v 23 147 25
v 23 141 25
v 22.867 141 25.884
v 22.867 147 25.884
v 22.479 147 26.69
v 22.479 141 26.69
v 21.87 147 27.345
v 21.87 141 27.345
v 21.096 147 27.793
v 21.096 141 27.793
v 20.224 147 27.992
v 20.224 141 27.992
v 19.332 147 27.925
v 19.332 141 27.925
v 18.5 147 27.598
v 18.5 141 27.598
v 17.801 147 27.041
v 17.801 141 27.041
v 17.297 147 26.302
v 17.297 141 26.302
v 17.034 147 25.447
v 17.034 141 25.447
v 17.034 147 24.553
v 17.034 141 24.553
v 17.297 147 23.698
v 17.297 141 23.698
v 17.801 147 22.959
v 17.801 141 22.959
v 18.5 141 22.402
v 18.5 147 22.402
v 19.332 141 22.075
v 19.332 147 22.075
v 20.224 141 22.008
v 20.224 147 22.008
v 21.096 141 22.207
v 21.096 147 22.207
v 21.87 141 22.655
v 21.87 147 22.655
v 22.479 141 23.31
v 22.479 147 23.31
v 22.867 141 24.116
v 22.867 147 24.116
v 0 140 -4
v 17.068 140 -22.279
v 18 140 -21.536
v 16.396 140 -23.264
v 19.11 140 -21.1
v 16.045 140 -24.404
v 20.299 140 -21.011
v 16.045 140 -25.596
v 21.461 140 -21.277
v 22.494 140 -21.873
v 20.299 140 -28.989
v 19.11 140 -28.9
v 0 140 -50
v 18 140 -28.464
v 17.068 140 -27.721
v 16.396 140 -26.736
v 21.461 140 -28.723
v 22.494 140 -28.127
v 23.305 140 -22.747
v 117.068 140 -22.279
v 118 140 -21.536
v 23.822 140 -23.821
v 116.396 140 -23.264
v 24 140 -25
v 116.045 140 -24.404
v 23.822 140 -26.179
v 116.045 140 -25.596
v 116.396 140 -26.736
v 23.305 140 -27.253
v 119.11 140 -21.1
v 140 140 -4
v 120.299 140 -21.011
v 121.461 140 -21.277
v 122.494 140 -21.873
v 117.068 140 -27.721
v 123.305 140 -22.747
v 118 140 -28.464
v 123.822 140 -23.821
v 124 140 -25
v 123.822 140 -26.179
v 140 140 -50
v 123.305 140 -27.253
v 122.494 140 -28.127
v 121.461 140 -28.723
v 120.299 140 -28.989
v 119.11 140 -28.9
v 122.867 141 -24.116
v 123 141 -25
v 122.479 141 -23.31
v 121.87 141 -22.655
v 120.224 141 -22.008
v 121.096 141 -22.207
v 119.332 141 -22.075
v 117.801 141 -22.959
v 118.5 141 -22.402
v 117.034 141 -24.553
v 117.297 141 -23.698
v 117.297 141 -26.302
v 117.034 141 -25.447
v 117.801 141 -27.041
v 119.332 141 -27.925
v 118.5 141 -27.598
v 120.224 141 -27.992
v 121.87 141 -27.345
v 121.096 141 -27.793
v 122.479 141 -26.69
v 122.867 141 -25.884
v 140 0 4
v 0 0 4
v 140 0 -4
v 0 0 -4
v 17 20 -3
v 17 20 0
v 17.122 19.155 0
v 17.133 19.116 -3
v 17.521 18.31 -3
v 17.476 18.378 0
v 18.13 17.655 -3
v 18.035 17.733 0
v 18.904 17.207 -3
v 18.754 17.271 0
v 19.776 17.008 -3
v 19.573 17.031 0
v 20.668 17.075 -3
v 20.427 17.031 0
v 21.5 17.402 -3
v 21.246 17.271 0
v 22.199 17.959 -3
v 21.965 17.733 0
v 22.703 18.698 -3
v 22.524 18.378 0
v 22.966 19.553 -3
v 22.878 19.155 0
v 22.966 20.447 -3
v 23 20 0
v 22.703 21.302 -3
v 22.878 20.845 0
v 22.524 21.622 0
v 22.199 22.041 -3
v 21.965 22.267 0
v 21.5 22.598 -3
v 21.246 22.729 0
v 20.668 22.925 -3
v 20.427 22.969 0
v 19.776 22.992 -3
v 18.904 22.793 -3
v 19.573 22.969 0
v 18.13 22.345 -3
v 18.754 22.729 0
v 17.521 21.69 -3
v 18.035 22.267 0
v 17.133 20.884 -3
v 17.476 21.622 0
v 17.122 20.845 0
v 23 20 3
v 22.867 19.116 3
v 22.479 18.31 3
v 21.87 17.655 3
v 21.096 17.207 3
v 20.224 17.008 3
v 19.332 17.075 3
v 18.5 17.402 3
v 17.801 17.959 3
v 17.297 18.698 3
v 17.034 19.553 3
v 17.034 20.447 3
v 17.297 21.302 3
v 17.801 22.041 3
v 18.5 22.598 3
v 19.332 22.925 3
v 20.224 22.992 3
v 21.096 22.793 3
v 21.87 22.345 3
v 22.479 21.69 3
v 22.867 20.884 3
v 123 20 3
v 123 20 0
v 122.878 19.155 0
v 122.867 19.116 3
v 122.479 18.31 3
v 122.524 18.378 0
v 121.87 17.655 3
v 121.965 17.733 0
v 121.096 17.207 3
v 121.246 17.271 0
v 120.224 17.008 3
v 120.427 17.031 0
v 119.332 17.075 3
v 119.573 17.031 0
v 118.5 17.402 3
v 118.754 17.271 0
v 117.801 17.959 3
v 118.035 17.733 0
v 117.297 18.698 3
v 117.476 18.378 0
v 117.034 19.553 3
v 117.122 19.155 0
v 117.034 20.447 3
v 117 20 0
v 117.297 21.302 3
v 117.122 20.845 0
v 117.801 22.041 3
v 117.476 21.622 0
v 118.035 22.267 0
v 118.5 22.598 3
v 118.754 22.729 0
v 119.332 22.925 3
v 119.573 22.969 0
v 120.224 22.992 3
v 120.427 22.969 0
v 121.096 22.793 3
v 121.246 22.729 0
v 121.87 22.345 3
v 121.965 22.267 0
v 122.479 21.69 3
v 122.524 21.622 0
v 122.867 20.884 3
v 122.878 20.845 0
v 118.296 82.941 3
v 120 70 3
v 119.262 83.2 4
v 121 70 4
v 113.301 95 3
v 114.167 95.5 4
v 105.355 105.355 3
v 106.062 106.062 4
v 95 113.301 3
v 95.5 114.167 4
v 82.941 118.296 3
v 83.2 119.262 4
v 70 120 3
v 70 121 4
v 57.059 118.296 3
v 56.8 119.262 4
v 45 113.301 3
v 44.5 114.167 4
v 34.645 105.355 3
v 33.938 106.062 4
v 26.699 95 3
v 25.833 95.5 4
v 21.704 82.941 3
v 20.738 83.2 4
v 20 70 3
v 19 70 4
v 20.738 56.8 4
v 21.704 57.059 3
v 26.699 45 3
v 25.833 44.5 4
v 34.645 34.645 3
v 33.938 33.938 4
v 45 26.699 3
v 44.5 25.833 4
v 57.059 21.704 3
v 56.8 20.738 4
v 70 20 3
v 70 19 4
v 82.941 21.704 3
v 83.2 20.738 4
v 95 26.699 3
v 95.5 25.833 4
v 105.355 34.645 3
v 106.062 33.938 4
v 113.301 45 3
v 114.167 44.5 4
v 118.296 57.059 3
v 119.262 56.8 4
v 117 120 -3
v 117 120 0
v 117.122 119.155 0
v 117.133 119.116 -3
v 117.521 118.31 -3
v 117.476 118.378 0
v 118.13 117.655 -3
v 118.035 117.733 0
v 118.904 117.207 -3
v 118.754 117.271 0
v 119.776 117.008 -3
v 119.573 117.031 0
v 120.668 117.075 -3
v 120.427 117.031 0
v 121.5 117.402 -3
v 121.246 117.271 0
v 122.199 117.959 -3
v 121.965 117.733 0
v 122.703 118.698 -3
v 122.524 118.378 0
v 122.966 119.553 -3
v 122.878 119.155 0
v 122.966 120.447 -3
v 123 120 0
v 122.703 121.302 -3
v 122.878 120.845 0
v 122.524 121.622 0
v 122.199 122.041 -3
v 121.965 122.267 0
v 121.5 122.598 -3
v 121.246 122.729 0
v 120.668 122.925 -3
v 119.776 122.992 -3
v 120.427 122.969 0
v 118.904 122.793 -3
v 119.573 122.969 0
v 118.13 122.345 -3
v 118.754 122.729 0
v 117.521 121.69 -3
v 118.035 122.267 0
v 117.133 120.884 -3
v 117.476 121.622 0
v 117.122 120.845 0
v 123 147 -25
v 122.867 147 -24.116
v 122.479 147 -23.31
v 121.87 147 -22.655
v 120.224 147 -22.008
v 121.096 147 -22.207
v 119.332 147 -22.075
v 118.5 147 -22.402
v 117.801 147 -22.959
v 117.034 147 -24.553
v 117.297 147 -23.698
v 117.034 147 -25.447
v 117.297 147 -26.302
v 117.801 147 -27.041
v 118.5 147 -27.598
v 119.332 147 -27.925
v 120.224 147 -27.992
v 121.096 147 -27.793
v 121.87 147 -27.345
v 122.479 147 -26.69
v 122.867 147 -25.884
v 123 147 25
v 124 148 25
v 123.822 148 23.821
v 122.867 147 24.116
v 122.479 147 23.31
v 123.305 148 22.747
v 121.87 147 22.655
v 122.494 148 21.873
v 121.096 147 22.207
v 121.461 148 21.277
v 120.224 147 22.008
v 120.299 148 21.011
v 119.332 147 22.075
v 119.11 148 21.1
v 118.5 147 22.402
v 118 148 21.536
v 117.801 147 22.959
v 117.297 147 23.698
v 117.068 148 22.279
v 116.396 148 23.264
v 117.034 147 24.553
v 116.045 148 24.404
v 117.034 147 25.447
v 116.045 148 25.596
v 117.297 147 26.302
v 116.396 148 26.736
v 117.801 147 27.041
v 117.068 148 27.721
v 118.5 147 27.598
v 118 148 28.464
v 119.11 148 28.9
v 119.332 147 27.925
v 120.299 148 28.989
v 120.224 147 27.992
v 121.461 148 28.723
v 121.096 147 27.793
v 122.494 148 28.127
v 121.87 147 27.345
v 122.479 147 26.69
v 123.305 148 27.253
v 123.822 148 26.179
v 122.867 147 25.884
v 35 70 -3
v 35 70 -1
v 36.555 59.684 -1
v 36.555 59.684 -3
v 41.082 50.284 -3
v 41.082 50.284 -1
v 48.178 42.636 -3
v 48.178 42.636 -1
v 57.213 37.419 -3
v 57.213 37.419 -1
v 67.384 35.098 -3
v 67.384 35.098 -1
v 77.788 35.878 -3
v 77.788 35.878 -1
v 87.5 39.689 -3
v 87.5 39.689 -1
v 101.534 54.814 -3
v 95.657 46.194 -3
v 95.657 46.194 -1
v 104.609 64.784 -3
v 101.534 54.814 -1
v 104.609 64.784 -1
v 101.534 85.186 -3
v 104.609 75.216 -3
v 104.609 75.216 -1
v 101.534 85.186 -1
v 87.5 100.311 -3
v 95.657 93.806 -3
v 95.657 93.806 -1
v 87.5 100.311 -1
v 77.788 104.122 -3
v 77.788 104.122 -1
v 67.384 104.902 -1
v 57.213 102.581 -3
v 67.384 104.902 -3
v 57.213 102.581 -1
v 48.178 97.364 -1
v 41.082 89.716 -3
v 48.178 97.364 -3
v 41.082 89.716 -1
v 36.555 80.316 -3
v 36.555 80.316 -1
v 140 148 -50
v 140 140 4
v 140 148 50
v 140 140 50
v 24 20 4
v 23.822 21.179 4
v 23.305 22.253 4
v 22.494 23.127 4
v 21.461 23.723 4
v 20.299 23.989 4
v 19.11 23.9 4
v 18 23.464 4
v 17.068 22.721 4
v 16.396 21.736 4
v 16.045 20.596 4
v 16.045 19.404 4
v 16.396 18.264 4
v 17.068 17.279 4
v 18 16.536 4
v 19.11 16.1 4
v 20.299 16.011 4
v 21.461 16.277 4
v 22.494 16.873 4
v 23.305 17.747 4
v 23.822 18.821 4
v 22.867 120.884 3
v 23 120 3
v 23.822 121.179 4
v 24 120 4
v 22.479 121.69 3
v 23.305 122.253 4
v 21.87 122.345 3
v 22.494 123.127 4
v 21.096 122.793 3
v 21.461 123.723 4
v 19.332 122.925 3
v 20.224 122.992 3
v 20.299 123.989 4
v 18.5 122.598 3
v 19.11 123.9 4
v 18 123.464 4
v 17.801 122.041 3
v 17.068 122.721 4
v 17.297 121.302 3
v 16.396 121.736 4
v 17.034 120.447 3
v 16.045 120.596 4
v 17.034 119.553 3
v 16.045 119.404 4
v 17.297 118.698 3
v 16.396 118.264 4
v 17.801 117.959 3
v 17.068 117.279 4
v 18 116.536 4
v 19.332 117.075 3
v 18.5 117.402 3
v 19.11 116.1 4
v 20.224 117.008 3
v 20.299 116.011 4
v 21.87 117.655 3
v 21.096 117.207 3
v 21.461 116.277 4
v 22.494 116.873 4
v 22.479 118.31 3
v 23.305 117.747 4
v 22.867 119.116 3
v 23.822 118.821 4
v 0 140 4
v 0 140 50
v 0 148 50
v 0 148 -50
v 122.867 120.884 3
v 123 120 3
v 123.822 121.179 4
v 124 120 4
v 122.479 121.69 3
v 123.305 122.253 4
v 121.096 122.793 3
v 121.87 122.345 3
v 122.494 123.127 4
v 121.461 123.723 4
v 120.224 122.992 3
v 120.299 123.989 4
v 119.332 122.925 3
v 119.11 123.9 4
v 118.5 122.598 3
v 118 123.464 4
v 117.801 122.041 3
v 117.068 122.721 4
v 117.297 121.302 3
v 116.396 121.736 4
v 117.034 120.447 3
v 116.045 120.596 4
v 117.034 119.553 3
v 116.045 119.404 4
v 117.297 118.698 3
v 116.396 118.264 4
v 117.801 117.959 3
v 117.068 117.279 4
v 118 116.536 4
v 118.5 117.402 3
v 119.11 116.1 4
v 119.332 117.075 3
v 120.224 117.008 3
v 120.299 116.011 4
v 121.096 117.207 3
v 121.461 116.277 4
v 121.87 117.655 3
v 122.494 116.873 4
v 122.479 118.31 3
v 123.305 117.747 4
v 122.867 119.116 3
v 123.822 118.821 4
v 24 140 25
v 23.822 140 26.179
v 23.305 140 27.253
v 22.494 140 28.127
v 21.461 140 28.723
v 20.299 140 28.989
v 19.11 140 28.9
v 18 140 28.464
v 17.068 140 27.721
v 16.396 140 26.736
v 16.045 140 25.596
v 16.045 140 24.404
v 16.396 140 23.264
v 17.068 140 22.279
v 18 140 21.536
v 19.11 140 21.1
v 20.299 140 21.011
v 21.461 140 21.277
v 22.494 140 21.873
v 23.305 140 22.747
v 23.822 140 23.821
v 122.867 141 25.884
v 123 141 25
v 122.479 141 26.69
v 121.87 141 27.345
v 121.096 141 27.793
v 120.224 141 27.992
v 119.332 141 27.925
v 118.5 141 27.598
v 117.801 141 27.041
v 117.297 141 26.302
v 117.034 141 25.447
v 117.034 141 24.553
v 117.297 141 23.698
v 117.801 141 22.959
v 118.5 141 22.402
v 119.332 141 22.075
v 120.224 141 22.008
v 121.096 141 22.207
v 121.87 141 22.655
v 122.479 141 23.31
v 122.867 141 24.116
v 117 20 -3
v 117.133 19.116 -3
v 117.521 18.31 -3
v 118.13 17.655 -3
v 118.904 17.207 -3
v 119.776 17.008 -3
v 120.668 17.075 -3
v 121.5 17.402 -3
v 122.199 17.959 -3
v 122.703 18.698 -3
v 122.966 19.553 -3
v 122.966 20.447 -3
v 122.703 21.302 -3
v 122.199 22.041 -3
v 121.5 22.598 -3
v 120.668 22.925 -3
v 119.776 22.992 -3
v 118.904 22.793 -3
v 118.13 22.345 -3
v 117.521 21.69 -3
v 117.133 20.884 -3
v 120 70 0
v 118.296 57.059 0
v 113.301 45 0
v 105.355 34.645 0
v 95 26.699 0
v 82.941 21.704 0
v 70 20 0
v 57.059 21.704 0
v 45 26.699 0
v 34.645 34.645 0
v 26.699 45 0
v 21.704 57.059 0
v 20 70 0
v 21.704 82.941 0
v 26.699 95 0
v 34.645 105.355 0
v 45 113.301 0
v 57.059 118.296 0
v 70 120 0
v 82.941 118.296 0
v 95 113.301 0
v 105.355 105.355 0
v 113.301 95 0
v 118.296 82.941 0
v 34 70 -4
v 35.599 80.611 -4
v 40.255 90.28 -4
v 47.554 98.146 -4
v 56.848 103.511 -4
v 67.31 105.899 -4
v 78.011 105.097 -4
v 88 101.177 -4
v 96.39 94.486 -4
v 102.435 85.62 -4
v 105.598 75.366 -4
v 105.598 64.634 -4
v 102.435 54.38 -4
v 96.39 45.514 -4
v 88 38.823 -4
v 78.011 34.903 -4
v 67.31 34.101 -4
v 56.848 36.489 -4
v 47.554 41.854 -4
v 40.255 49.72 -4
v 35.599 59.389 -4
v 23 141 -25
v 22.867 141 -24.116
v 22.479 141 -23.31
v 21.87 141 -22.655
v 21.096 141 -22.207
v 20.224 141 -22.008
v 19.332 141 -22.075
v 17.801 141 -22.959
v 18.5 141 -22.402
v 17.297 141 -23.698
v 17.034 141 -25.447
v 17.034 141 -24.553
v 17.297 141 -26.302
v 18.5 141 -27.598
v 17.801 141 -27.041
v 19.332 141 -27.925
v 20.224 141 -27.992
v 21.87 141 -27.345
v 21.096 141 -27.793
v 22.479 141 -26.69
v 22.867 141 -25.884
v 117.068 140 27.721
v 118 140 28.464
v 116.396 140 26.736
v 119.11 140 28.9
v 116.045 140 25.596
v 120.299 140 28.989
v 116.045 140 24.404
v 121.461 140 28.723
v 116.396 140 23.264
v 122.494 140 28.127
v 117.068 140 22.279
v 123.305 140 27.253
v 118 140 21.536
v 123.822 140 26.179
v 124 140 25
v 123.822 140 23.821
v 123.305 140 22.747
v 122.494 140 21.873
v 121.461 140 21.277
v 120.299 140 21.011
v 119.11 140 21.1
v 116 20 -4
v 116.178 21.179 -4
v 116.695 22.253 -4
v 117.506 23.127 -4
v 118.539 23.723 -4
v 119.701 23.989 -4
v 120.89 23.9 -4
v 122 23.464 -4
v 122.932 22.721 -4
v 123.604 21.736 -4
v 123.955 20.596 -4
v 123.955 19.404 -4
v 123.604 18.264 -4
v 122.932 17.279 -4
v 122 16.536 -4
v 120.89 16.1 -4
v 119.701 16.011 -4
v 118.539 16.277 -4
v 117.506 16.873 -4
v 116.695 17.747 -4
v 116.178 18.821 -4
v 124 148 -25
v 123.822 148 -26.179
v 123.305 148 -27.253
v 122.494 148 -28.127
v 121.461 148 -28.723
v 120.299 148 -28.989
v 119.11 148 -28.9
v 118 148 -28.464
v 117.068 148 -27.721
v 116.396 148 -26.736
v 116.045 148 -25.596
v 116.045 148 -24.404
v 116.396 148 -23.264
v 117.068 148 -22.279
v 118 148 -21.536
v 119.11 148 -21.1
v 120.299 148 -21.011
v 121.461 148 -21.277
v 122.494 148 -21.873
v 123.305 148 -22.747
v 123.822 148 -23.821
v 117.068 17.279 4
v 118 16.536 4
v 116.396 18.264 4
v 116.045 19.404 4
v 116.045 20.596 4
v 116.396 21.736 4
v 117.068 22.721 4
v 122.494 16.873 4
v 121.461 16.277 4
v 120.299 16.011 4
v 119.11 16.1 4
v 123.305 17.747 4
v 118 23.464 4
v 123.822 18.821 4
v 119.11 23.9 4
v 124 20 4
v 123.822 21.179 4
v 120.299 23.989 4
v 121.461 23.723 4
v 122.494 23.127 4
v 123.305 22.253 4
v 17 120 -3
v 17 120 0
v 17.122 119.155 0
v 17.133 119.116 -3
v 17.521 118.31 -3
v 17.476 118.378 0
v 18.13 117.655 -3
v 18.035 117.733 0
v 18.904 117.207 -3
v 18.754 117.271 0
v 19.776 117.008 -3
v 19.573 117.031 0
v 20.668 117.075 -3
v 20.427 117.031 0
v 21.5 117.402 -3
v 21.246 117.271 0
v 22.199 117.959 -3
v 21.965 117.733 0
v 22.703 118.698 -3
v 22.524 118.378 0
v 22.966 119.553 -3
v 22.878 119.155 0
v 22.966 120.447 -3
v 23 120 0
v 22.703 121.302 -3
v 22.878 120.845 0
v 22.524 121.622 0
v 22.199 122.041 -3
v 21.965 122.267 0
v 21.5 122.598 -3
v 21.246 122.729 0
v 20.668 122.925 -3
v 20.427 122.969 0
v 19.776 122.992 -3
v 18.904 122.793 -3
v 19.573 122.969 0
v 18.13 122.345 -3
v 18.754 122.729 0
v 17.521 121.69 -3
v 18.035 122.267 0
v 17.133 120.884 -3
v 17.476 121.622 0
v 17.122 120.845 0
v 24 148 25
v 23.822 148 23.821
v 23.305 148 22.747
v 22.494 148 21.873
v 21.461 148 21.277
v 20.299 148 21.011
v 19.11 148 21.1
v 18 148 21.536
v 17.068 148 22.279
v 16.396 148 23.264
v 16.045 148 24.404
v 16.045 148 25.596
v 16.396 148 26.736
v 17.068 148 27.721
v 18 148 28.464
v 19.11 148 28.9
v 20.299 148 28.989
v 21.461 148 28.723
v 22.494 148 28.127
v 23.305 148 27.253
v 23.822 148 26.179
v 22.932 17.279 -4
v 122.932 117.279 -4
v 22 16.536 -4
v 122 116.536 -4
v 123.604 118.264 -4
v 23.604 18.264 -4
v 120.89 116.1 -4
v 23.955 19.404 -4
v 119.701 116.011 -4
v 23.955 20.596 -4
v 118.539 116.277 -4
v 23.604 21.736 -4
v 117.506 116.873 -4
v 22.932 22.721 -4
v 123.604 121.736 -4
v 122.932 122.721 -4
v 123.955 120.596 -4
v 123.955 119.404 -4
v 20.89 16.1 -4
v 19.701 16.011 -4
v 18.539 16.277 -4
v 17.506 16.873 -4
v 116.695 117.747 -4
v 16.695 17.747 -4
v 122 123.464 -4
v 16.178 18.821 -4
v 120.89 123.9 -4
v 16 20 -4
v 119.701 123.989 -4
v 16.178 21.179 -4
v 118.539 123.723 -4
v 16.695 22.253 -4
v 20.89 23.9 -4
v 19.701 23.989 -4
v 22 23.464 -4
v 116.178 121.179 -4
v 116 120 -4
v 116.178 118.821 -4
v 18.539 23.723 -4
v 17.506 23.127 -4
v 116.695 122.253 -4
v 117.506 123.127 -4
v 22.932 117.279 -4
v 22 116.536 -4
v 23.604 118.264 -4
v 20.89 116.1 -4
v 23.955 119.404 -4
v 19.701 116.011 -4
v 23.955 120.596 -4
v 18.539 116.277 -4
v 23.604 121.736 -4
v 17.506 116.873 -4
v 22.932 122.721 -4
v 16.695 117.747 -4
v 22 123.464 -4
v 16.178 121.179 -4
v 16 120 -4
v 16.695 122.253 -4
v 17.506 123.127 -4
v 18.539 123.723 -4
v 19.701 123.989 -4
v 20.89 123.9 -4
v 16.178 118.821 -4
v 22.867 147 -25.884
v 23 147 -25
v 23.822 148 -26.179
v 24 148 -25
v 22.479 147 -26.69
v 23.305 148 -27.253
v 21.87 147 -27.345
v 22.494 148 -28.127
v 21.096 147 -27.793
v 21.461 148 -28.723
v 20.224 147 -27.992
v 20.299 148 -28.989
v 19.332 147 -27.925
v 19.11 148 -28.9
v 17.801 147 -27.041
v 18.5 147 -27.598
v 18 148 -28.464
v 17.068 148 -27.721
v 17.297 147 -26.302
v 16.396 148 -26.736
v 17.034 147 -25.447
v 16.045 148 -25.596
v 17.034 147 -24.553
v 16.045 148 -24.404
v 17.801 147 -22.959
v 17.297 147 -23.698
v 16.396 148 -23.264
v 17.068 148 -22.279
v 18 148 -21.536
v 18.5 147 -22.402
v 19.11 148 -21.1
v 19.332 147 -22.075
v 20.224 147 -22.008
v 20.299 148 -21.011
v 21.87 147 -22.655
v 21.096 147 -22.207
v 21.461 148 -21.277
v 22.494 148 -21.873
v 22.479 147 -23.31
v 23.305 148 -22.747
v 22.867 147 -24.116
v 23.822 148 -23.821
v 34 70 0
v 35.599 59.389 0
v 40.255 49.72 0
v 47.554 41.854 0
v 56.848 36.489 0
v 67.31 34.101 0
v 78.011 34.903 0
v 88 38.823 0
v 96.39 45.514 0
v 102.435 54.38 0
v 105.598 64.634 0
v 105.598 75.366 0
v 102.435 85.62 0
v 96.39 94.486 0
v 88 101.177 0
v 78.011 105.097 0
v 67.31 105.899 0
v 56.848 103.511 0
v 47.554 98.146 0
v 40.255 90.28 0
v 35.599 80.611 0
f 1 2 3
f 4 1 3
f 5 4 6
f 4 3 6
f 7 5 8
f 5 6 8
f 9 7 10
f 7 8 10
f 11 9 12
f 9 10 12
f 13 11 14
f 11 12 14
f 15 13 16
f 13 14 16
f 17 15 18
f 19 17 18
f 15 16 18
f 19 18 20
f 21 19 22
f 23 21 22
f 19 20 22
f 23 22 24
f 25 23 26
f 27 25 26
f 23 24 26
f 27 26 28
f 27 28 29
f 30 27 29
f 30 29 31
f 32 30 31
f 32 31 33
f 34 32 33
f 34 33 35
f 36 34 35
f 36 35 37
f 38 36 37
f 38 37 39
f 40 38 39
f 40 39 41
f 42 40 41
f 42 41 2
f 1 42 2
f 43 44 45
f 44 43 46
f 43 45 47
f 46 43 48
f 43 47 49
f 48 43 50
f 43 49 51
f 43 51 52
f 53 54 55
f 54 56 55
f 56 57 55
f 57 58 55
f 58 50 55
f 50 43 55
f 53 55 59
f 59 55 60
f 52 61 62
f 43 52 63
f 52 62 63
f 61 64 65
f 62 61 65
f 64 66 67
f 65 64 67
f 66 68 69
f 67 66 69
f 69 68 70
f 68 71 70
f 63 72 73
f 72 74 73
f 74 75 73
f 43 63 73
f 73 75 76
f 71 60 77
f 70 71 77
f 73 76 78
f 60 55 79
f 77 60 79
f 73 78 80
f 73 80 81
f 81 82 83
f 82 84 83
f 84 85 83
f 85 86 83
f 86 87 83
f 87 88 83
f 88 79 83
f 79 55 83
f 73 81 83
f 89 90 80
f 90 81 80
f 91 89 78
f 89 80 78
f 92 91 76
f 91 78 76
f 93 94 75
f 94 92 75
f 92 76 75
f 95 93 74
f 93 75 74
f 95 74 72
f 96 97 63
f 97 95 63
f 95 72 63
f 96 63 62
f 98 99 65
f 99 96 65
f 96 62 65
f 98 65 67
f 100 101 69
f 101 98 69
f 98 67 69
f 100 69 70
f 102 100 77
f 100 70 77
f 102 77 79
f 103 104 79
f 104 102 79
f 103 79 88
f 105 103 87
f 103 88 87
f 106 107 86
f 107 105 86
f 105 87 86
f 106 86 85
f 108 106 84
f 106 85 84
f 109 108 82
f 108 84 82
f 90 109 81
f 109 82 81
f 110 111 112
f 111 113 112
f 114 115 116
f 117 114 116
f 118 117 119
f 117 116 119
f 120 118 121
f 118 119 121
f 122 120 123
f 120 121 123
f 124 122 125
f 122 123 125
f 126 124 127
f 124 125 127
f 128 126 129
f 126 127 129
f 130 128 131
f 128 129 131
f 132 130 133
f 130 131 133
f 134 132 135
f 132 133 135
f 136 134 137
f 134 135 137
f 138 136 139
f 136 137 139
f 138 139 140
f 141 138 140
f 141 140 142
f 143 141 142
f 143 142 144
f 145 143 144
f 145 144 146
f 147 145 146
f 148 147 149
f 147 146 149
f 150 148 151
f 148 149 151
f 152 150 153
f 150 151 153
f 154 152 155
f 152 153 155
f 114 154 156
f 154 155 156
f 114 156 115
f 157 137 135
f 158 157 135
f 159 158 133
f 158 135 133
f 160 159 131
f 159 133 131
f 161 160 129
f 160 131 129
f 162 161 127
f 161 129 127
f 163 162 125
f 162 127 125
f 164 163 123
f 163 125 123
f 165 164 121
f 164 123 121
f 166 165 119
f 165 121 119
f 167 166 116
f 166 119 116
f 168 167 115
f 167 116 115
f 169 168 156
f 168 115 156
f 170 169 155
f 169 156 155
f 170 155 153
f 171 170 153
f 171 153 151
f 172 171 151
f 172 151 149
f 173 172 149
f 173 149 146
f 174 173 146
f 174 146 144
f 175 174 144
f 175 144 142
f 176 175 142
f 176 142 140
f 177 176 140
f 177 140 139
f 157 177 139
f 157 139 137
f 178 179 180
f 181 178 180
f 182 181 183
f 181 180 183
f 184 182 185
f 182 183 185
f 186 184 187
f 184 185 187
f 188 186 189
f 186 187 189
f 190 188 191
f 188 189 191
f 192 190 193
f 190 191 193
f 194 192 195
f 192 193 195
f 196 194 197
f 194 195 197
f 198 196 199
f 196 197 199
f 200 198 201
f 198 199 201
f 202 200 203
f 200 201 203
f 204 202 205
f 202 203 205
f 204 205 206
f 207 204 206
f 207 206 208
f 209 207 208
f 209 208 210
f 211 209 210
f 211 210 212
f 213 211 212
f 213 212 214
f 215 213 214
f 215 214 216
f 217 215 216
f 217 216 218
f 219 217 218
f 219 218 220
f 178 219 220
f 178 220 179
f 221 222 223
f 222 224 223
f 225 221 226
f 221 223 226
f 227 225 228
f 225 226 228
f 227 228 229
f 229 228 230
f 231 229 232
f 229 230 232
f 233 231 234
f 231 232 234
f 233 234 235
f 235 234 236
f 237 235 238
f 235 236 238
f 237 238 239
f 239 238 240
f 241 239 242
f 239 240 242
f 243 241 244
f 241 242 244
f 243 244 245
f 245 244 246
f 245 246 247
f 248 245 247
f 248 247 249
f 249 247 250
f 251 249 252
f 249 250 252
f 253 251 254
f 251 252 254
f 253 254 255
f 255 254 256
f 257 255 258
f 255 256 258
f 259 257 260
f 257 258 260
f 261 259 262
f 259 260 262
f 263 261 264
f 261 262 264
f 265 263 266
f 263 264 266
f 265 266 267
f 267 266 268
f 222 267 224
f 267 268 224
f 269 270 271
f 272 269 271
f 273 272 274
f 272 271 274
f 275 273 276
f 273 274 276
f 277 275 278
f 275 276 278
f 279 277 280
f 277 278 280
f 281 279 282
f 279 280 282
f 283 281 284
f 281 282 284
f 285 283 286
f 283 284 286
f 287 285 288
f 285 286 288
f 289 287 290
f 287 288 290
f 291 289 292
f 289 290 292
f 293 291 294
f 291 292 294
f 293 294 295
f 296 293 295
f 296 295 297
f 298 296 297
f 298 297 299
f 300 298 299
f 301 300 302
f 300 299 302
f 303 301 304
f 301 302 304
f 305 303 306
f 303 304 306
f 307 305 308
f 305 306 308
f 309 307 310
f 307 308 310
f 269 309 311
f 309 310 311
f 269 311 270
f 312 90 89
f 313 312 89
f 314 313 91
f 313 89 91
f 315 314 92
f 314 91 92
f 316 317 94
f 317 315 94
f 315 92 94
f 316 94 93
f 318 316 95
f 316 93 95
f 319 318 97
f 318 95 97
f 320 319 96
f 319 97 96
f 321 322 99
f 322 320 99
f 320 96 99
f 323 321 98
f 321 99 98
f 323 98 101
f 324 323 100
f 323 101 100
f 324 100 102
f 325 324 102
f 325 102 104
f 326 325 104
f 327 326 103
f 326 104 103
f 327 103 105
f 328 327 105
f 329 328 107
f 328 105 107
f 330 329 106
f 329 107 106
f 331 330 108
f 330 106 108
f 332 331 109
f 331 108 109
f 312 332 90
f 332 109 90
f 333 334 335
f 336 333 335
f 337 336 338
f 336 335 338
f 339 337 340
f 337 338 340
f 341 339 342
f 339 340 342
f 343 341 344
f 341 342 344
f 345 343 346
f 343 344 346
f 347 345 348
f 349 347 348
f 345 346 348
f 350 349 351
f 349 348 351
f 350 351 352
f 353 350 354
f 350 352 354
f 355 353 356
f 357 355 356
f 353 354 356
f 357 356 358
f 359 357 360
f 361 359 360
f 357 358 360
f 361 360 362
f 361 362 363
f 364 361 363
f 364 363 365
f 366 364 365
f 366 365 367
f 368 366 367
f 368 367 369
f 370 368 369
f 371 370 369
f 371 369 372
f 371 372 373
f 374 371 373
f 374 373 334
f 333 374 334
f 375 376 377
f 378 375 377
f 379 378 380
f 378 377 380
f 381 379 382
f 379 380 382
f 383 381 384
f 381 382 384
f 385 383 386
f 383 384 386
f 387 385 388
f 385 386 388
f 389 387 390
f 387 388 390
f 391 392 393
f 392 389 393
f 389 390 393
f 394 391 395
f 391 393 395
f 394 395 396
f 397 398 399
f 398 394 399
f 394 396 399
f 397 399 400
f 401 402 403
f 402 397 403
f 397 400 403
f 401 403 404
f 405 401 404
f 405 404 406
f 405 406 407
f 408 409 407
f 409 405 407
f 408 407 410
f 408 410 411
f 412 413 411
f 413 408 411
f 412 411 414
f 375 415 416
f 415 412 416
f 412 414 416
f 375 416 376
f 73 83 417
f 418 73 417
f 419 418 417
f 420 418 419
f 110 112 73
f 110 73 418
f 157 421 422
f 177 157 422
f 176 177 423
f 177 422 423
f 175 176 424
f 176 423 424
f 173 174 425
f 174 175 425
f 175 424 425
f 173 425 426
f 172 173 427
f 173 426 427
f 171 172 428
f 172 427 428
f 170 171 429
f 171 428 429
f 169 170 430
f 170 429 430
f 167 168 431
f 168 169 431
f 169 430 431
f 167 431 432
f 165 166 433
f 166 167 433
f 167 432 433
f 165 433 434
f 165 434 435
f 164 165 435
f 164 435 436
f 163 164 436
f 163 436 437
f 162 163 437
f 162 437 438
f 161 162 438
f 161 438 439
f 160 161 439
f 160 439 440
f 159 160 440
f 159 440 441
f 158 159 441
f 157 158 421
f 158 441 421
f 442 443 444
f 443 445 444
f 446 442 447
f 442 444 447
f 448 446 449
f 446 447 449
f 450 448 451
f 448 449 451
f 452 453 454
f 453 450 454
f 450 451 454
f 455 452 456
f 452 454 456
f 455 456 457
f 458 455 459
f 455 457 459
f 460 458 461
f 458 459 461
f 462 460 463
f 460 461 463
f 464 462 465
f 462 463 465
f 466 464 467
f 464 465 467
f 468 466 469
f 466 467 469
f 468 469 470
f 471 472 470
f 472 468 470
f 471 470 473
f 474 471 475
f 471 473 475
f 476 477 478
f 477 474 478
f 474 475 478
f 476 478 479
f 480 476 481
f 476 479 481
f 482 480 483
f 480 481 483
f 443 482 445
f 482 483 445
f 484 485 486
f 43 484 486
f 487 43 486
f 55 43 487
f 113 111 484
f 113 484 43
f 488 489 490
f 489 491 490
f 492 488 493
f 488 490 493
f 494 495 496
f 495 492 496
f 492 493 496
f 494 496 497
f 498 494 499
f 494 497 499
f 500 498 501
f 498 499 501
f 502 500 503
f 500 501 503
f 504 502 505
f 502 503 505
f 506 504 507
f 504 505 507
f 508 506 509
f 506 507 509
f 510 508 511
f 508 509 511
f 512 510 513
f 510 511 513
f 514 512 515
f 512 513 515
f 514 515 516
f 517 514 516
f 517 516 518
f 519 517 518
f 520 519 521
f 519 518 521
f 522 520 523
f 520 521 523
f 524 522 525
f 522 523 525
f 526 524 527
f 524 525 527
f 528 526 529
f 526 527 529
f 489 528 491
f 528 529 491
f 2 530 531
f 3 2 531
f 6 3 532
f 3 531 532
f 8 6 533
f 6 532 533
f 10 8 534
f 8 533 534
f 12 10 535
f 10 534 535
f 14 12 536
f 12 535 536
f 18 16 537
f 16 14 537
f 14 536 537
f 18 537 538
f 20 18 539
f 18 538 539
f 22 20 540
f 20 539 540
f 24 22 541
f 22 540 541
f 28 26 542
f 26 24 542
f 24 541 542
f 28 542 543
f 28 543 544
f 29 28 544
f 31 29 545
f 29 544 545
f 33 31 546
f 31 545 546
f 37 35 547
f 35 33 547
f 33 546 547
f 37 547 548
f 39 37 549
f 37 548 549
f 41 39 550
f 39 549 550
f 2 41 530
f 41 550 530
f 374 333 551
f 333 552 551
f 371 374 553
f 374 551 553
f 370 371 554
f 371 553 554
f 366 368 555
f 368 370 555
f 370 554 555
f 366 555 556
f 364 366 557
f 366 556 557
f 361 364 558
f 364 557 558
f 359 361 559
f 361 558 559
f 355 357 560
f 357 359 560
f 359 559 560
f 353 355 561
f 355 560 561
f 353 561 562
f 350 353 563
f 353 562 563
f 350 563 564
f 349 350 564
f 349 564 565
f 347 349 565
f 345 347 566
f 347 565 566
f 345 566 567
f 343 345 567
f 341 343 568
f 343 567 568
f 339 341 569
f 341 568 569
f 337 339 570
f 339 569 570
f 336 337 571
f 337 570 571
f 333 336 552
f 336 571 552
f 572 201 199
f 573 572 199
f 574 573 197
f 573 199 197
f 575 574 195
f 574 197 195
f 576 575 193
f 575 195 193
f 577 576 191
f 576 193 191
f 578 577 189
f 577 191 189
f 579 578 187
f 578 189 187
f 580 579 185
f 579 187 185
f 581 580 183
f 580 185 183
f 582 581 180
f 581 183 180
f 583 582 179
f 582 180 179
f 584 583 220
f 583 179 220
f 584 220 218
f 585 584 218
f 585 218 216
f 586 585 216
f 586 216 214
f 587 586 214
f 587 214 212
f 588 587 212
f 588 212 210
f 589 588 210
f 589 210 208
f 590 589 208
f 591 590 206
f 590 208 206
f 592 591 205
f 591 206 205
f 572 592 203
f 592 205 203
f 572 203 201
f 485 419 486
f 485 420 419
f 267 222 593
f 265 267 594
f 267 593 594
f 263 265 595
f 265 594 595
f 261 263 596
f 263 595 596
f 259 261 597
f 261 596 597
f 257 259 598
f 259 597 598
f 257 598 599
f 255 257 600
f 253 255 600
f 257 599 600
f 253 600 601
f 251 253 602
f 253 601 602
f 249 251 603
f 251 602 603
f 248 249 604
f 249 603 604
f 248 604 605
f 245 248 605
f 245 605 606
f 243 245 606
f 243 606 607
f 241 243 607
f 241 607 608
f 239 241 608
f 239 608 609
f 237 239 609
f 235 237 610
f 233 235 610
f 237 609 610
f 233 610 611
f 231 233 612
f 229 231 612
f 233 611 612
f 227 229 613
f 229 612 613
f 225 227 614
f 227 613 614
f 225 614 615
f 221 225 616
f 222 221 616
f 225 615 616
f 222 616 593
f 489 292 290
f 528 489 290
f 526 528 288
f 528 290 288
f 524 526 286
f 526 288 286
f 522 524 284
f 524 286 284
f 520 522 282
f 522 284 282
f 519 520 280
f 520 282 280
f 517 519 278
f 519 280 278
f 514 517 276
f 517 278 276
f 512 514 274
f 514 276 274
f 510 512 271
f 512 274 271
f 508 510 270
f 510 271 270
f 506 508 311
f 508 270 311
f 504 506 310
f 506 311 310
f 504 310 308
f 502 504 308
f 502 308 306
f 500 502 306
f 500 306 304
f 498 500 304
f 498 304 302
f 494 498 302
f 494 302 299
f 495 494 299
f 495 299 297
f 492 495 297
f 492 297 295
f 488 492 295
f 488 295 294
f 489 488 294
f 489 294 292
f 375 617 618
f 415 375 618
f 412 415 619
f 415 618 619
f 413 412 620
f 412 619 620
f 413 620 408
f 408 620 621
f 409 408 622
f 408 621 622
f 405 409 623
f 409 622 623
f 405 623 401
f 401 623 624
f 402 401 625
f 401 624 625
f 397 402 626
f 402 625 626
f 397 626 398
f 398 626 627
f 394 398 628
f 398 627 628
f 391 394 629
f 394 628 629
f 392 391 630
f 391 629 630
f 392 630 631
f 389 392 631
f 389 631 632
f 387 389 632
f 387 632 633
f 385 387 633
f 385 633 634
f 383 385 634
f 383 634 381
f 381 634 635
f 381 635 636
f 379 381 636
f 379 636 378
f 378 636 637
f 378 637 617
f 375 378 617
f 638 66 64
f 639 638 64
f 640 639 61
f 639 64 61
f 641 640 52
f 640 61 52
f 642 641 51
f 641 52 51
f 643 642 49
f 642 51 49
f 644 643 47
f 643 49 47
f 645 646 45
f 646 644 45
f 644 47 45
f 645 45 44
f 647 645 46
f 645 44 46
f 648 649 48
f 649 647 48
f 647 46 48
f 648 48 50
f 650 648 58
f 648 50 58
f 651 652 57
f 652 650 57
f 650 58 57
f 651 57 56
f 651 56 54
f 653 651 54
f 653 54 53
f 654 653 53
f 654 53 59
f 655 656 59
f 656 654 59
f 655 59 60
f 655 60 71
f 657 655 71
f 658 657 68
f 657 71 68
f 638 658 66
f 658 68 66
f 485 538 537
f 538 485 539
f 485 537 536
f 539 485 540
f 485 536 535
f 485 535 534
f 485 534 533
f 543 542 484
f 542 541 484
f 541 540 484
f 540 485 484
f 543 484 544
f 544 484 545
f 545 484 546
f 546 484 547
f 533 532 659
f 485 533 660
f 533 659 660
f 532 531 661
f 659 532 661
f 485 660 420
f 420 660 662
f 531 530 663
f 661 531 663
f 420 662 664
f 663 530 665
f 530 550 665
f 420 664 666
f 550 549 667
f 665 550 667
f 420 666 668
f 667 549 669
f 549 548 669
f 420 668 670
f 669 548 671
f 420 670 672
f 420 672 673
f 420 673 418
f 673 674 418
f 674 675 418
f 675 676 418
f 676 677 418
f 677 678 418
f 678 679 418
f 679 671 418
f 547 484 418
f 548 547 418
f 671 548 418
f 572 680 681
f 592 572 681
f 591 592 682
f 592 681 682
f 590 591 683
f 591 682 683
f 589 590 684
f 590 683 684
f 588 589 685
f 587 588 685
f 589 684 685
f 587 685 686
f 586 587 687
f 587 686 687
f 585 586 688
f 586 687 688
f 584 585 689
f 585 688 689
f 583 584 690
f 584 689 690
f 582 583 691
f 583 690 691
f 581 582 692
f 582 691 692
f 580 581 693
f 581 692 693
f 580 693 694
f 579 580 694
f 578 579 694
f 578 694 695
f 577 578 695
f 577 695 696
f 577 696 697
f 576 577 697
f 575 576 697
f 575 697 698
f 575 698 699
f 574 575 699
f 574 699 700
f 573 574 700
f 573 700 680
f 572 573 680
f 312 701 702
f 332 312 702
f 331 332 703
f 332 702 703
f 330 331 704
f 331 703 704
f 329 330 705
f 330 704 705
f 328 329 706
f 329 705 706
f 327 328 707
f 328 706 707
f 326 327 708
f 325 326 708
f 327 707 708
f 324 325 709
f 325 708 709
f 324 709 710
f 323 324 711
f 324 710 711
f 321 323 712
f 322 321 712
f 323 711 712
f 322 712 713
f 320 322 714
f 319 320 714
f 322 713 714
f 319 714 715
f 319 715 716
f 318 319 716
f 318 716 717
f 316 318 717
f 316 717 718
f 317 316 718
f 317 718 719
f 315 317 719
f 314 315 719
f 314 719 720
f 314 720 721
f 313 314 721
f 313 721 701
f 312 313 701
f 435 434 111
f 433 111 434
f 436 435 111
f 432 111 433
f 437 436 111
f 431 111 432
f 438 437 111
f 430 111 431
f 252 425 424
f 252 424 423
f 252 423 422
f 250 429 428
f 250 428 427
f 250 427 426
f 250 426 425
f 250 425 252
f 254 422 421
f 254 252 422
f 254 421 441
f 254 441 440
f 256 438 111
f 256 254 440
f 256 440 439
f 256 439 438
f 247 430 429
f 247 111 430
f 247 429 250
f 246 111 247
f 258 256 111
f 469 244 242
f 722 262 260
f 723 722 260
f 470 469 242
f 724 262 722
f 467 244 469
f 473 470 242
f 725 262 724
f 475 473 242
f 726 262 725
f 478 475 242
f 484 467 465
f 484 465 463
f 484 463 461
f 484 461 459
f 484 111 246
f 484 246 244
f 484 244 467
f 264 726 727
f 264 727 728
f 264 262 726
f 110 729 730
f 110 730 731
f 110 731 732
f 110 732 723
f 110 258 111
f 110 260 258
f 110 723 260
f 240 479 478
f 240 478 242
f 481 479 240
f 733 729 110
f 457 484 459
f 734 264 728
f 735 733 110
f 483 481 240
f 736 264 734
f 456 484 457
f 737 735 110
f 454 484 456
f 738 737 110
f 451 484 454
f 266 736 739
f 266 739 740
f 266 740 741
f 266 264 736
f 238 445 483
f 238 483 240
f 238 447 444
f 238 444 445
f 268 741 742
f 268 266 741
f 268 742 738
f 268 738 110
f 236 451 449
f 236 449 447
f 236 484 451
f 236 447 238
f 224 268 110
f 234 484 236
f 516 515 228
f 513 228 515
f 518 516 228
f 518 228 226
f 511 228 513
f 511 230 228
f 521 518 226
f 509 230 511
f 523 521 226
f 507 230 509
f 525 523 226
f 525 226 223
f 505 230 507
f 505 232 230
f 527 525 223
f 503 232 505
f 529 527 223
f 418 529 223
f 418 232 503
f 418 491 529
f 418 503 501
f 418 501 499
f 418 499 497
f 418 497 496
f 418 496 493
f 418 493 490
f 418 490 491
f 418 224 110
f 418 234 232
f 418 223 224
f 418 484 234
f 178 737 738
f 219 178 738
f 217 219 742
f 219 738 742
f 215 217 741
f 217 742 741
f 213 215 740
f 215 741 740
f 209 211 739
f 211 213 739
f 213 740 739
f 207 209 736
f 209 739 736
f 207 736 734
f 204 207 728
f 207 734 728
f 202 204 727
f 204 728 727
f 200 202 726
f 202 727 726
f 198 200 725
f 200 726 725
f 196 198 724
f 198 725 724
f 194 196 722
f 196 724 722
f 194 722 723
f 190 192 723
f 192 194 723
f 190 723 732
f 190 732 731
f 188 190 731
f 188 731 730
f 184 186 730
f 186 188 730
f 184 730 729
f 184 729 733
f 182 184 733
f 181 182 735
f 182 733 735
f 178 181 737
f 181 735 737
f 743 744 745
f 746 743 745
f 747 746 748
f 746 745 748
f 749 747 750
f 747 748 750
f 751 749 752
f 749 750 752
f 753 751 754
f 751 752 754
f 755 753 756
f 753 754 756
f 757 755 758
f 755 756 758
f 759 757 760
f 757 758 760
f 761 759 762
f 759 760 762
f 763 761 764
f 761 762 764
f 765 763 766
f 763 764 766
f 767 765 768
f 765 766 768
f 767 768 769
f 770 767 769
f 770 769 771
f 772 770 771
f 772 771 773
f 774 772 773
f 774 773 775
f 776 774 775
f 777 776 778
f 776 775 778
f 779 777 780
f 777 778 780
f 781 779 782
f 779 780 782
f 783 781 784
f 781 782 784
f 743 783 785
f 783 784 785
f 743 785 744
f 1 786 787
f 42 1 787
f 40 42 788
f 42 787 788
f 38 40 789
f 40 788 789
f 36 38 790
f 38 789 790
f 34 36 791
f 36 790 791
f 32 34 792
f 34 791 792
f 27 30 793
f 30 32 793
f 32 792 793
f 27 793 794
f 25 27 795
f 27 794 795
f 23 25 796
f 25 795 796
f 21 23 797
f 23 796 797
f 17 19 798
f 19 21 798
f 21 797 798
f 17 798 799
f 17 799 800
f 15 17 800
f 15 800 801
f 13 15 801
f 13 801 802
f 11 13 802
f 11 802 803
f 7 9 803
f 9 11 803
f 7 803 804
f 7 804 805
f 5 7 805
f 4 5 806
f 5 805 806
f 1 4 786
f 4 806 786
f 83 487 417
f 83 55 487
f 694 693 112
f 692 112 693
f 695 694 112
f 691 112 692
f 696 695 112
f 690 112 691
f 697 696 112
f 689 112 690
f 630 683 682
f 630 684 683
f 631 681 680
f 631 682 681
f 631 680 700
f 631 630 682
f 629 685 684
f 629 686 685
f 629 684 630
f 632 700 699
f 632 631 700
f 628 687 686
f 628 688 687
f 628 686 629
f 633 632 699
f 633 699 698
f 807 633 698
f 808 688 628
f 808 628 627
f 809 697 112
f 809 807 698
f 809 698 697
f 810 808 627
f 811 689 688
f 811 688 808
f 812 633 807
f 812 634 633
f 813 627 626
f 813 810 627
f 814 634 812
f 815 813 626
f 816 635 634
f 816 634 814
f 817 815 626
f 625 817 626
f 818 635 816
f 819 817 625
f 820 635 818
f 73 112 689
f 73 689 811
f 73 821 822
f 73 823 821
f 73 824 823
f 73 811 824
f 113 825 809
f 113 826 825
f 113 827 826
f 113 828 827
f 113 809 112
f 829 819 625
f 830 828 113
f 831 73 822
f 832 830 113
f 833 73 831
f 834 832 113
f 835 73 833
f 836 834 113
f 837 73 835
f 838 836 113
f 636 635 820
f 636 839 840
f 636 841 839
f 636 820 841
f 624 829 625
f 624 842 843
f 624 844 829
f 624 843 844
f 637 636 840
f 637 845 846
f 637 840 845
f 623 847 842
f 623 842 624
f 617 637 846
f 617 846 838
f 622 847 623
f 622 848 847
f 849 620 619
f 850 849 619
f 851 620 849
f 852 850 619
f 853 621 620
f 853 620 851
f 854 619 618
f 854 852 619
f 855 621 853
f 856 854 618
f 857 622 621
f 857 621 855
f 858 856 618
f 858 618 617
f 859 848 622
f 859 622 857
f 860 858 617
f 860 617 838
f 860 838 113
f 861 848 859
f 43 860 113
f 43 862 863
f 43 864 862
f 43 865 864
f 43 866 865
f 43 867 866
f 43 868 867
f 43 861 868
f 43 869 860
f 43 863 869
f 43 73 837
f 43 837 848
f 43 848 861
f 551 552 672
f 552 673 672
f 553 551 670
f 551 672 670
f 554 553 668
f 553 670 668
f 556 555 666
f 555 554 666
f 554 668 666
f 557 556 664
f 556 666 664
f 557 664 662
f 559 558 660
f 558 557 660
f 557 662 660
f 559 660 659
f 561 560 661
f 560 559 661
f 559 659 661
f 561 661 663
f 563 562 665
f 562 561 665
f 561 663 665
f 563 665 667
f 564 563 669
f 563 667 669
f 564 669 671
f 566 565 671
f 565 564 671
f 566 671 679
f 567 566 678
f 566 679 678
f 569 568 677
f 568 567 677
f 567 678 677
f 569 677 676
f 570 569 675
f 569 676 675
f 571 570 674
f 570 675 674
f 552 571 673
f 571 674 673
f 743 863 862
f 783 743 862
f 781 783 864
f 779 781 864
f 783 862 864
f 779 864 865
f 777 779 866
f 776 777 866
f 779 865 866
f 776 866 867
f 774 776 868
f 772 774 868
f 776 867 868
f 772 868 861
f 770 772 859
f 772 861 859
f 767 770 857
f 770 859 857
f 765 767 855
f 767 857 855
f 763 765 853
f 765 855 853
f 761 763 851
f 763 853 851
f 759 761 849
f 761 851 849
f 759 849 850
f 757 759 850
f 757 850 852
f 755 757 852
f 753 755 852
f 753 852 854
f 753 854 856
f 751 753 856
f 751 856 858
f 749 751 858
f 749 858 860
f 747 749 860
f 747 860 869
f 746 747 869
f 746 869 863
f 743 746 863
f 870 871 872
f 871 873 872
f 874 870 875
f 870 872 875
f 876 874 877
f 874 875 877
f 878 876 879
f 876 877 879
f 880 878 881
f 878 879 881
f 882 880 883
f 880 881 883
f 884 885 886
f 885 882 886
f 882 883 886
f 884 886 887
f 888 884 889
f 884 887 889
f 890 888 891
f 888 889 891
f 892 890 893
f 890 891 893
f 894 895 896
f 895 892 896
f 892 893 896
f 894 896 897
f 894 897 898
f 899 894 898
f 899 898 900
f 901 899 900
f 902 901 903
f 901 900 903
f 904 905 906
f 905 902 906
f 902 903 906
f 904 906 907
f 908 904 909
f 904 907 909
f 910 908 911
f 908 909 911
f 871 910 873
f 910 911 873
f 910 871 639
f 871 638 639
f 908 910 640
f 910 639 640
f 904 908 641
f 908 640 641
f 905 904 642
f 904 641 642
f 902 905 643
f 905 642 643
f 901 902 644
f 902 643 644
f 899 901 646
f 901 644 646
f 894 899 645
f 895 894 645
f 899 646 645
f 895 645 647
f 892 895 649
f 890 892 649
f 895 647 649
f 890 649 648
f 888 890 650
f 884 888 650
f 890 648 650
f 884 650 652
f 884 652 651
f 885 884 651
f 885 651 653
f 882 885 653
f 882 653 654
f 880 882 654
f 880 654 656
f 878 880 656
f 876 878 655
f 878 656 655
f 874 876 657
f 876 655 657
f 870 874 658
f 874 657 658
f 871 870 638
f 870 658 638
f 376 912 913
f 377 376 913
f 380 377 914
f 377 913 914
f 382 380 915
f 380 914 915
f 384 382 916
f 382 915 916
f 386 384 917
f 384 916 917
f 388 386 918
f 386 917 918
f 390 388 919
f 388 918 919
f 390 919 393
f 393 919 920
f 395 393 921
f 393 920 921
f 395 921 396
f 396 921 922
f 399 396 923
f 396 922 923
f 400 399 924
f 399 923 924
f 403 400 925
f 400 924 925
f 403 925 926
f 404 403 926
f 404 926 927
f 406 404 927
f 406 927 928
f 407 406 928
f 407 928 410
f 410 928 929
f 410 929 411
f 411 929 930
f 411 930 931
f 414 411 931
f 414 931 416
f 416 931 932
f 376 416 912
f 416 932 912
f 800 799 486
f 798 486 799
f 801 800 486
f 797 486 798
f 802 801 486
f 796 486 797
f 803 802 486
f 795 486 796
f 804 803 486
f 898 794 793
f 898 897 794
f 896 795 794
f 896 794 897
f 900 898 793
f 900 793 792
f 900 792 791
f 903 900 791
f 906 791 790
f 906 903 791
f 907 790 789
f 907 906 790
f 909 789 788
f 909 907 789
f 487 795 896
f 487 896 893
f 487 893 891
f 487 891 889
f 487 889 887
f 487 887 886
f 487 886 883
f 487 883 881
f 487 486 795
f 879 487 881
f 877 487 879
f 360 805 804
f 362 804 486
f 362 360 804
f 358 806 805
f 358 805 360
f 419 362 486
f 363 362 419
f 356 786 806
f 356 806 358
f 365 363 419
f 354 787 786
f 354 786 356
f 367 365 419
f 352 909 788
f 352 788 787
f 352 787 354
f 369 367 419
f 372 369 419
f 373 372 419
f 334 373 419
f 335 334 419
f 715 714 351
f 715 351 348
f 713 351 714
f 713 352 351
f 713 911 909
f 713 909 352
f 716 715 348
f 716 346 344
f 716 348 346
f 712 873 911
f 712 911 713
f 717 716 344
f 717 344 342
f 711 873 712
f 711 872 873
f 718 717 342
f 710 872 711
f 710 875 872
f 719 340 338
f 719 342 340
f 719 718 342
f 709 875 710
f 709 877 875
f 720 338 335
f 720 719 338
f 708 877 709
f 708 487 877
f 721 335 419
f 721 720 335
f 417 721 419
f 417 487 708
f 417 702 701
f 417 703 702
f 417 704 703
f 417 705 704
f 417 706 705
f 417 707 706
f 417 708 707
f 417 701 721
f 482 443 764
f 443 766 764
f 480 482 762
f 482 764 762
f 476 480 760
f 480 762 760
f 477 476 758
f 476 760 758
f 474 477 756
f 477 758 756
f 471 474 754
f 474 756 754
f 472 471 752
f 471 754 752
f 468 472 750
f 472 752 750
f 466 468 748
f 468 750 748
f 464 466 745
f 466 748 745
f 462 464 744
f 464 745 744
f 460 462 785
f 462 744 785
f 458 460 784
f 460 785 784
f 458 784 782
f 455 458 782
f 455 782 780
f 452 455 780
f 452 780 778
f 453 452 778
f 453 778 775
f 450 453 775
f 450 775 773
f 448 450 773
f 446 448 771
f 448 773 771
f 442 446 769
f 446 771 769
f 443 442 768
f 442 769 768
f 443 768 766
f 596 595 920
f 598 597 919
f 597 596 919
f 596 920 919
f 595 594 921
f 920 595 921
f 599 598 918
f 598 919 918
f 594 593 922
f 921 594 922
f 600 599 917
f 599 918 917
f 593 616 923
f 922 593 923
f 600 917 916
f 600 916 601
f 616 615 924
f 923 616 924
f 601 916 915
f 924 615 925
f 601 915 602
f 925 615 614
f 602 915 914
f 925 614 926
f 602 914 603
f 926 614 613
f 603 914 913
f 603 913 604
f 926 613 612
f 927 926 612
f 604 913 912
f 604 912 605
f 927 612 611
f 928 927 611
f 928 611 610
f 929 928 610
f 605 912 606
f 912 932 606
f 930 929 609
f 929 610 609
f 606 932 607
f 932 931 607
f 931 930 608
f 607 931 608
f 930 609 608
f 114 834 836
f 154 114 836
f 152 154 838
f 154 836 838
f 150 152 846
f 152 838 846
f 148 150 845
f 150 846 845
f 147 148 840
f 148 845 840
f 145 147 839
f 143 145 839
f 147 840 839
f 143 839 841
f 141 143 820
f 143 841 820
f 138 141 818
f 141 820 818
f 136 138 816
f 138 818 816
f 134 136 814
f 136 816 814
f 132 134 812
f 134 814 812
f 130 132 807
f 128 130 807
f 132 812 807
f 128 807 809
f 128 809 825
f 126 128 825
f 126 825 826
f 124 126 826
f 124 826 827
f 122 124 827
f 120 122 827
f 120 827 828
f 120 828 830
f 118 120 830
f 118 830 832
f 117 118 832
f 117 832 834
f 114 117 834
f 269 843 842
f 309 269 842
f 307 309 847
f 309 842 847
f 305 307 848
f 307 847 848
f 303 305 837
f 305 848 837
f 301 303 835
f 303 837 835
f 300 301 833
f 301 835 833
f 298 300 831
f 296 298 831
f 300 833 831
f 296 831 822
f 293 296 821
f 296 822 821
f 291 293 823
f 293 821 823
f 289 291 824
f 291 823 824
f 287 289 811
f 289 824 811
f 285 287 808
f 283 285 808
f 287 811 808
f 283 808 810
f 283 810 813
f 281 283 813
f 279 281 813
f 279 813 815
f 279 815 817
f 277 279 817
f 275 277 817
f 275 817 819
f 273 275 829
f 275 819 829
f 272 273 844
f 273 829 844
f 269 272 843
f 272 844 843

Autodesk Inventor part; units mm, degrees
ref_plane "YZ Plane" through (0, 0, 0) normal (1, 0, 0) x (0, 1, 0)
ref_plane "XZ Plane" through (0, 0, 0) normal (0, 1, 0) x (-1, 0, 0)
ref_plane "XY Plane" through (0, 0, 0) normal (0, 0, 1) x (1, 0, 0)
sketch "Эскиз1" plane through (0, 0, 0) normal (0, 0, 1) x (1, 0, 0)
  line L0 (0, 0) -> (140, 0)
  line L1 (140, 0) -> (140, 140)
  line L2 (140, 140) -> (0, 140)
  line L3 (0, 140) -> (0, 0)
  circle A0 centre (70, 70) radius 50
  line L4 (0, 140) -> (20, 140)
  line L5 (20, 140) -> (20, 120)
  line L6 (140, 0) -> (140, 20)
  line L7 (140, 20) -> (120, 20)
  line L8 (20, 120) -> (120, 120)
  line L9 (120, 120) -> (120, 20)
  line L10 (120, 20) -> (20, 20)
  line L11 (20, 20) -> (20, 120)
  line L12 (70, 70) -> (0, 70)
  line L13 (0, 70) -> (0, 0)
  line L14 (0, 0) -> (70, 0)
  line L15 (70, 0) -> (70, 70)
  circle A1 centre (20, 120) radius 3
  circle A2 centre (120, 120) radius 3
  circle A3 centre (120, 20) radius 3
  circle A4 centre (20, 20) radius 3
  dimension "d0" = 140
  dimension "d1" = 140
  dimension "d2" = 100
  dimension "d3" = 20
  dimension "d4" = 20
  dimension "d5" = 20
  dimension "d6" = 20
  dimension "d7" = 70
  dimension "d8" = 70
  dimension "d9" = 6
  dimension "d10" = 6
  dimension "d11" = 6
  dimension "d14" = 6
extrude "Выдавливание1" add sketch "Эскиз1" along normal blind 4 contours L3 L12 L11 A4 L10 L15 L0 | L15 L10 A3 L7 L1 L0 | L3 L2 L5 A1 L11 L12 | L10 A4 L11 A0 | A0 L9 A3 L10 | L11 A1 L8 A0 | L7 A3 L9 A2 L8 A1 L5 L2 L1 | A0 L8 A2 L9
sketch "Эскиз2" plane through (0, 140, 0) normal (0, 1, 0) x (1, 0, 0)
  line L0 (0, 0) -> (0, -4) projected
  line L1 (0, 0) -> (140, 0)
  line L2 (140, 0) -> (140, -50)
  line L3 (140, -50) -> (0, -50)
  line L4 (0, -50) -> (0, 0)
  line L5 (0, -25) -> (20, -25)
  line L6 (140, -25) -> (120, -25)
  circle A0 centre (120, -25) radius 3
  circle A1 centre (20, -25) radius 3
  line L7 (140, 0) -> (0, 0)
  line L8 (0, 0) -> (0, 50)
  line L9 (0, 50) -> (140, 50)
  line L10 (140, 50) -> (140, 0)
  line L11 (140, 25) -> (120, 25)
  circle A2 centre (120, 25) radius 3
  circle A3 centre (20, 25) radius 3
  line L12 (0, 25) -> (20, 25)
  point P0 (0, -4)
  point P1 (0, 0)
  dimension "d15" = 140
  dimension "d16" = 50
  dimension "d17" = 20
  dimension "d18" = 20
  dimension "d19" = 6
  dimension "d20" = 6
  dimension "d23" = 140
  dimension "d24" = 50
  dimension "d25" = 6
  dimension "d26" = 6
  dimension "d30" = 20
extrude "Выдавливание2" add sketch "Эскиз2" along normal blind 8
sketch "Эскиз3" plane through (0, 0, 0) normal (0, 0, -1) x (-1, 0, 0)
  line L0 (0, 0) -> (-140, 0) projected
  line L1 (-140, 140) -> (0, 140) projected
  line L2 (-140, 0) -> (0, 0)
  line L3 (0, 0) -> (0, 140)
  line L4 (0, 140) -> (-140, 140)
  line L5 (-140, 140) -> (-140, 0)
  circle A0 centre (-120, 20) radius 3 projected
  circle A1 centre (-120, 120) radius 3 projected
  circle A2 centre (-20, 120) radius 3 projected
  circle A3 centre (-20, 20) radius 3 projected
  circle A4 centre (-70, 70) radius 35
  circle A5 centre (-70, 70) radius 50 projected
  dimension "d27" = 70
extrude "Выдавливание3" add sketch "Эскиз3" along normal blind 4 contours L0 L5 L1 L3 | A5
chamfer "Фаска1" distance 1 angle 45 19 edges at (23, 20, -4) (105, 70, -4) (123, 20, -4) (123, 120, -4) (117, 140, -25) (17, 140, -25) (23, 120, -4) (20, 70, 4) (105, 70, 0) (117, 120, 4) (117, 140, 25) (17, 140, 25) (17, 120, 4) (17, 20, 4) (117, 20, 4) (17, 148, 25) (17, 148, -25) (117, 148, 25) (117, 148, -25)
properties part number "Кронштейн мотора"
